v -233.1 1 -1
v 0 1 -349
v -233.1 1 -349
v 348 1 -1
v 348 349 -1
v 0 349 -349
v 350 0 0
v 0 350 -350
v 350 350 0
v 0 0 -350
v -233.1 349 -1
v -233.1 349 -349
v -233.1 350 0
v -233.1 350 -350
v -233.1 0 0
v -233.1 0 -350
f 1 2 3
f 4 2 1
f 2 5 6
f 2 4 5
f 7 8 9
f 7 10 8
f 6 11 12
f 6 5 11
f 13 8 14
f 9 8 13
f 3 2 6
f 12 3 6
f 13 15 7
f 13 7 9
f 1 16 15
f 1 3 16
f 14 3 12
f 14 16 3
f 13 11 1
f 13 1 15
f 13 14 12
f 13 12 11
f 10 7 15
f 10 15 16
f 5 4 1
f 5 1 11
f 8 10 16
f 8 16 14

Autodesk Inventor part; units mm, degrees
ref_plane "YZ Plane" through (0, 0, 0) normal (1, 0, 0) x (0, 1, 0)
ref_plane "XZ Plane" through (0, 0, 0) normal (0, 1, 0) x (-1, 0, 0)
ref_plane "XY Plane" through (0, 0, 0) normal (0, 0, 1) x (1, 0, 0)
sketch "Boceto1" plane through (0, 0, 0) normal (0, 1, 0) x (-1, 0, 0)
  line L0 (0, 0) -> (0, -350)
  line L1 (0, -350) -> (-350, 0)
  line L2 (-350, 0) -> (0, 0)
  dimension "d0" = 350
  dimension "d1" = 45
extrude "Extrusión1" add sketch "Boceto1" along normal blind 1
sketch "Boceto2" plane through (0, 1, 0) normal (0, 1, 0) x (1, 0, 0)
  line L0 (350, 0) -> (0, 350) projected
  line L1 (350, 0) -> (349, 0)
  line L2 (0, 0) -> (350, 0) projected
  line L3 (0, 350) -> (0, 349)
  line L4 (0, 350) -> (0, 0) projected
  line L5 (0, 0) -> (0, 1)
  line L6 (0, 0) -> (1, 0)
  line L7 (349, 0) -> (0, 349)
  line L8 (1, 0) -> (1, 348)
  line L9 (0, 1) -> (348, 1)
  dimension "d4" = 1
  dimension "d5" = 1
  dimension "d6" = 1
  dimension "d7" = 1
extrude "Extrusión2" add sketch "Boceto2" along normal blind 348 contours L1 L7 L3 L0 | L2 L8 L9 L7 | L2 L4 L9 L8
sketch "Boceto3" plane through (0, 349, 0) normal (0, 1, 0) x (1, 0, 0)
  line L0 (0, 350) -> (0, 0) projected
  line L1 (0, 0) -> (0, 350)
  line L2 (0, 0) -> (350, 0) projected
  line L3 (0, 350) -> (350, 0)
  line L4 (350, 0) -> (0, 0)
extrude "Extrusión3" add sketch "Boceto3" along normal blind 1
sketch "Boceto4" plane through (0, 0, -350) normal (-1, 0, 0) x (0, 0, 1)
  line L0 (349, 1) -> (349, 349) projected
  line L1 (349, 1) -> (349, 349)
  line L2 (1, 1) -> (1, 349) projected
  line L3 (349, 349) -> (1, 349)
  line L4 (1, 349) -> (1, 1)
  line L5 (1, 1) -> (349, 1)
  line L6 (0, 0) -> (0, 350) projected
  line L7 (0, 350) -> (350, 350)
  line L8 (350, 0) -> (350, 350) projected
  line L9 (350, 350) -> (350, 0)
  line L10 (350, 0) -> (0, 0) projected
  line L11 (350, 0) -> (0, 0)
  line L12 (0, 0) -> (0, 350)
extrude "Extrusión4" add sketch "Boceto4" along normal blind 233.1
properties part number "cajon_1_proyecto_diseno"
